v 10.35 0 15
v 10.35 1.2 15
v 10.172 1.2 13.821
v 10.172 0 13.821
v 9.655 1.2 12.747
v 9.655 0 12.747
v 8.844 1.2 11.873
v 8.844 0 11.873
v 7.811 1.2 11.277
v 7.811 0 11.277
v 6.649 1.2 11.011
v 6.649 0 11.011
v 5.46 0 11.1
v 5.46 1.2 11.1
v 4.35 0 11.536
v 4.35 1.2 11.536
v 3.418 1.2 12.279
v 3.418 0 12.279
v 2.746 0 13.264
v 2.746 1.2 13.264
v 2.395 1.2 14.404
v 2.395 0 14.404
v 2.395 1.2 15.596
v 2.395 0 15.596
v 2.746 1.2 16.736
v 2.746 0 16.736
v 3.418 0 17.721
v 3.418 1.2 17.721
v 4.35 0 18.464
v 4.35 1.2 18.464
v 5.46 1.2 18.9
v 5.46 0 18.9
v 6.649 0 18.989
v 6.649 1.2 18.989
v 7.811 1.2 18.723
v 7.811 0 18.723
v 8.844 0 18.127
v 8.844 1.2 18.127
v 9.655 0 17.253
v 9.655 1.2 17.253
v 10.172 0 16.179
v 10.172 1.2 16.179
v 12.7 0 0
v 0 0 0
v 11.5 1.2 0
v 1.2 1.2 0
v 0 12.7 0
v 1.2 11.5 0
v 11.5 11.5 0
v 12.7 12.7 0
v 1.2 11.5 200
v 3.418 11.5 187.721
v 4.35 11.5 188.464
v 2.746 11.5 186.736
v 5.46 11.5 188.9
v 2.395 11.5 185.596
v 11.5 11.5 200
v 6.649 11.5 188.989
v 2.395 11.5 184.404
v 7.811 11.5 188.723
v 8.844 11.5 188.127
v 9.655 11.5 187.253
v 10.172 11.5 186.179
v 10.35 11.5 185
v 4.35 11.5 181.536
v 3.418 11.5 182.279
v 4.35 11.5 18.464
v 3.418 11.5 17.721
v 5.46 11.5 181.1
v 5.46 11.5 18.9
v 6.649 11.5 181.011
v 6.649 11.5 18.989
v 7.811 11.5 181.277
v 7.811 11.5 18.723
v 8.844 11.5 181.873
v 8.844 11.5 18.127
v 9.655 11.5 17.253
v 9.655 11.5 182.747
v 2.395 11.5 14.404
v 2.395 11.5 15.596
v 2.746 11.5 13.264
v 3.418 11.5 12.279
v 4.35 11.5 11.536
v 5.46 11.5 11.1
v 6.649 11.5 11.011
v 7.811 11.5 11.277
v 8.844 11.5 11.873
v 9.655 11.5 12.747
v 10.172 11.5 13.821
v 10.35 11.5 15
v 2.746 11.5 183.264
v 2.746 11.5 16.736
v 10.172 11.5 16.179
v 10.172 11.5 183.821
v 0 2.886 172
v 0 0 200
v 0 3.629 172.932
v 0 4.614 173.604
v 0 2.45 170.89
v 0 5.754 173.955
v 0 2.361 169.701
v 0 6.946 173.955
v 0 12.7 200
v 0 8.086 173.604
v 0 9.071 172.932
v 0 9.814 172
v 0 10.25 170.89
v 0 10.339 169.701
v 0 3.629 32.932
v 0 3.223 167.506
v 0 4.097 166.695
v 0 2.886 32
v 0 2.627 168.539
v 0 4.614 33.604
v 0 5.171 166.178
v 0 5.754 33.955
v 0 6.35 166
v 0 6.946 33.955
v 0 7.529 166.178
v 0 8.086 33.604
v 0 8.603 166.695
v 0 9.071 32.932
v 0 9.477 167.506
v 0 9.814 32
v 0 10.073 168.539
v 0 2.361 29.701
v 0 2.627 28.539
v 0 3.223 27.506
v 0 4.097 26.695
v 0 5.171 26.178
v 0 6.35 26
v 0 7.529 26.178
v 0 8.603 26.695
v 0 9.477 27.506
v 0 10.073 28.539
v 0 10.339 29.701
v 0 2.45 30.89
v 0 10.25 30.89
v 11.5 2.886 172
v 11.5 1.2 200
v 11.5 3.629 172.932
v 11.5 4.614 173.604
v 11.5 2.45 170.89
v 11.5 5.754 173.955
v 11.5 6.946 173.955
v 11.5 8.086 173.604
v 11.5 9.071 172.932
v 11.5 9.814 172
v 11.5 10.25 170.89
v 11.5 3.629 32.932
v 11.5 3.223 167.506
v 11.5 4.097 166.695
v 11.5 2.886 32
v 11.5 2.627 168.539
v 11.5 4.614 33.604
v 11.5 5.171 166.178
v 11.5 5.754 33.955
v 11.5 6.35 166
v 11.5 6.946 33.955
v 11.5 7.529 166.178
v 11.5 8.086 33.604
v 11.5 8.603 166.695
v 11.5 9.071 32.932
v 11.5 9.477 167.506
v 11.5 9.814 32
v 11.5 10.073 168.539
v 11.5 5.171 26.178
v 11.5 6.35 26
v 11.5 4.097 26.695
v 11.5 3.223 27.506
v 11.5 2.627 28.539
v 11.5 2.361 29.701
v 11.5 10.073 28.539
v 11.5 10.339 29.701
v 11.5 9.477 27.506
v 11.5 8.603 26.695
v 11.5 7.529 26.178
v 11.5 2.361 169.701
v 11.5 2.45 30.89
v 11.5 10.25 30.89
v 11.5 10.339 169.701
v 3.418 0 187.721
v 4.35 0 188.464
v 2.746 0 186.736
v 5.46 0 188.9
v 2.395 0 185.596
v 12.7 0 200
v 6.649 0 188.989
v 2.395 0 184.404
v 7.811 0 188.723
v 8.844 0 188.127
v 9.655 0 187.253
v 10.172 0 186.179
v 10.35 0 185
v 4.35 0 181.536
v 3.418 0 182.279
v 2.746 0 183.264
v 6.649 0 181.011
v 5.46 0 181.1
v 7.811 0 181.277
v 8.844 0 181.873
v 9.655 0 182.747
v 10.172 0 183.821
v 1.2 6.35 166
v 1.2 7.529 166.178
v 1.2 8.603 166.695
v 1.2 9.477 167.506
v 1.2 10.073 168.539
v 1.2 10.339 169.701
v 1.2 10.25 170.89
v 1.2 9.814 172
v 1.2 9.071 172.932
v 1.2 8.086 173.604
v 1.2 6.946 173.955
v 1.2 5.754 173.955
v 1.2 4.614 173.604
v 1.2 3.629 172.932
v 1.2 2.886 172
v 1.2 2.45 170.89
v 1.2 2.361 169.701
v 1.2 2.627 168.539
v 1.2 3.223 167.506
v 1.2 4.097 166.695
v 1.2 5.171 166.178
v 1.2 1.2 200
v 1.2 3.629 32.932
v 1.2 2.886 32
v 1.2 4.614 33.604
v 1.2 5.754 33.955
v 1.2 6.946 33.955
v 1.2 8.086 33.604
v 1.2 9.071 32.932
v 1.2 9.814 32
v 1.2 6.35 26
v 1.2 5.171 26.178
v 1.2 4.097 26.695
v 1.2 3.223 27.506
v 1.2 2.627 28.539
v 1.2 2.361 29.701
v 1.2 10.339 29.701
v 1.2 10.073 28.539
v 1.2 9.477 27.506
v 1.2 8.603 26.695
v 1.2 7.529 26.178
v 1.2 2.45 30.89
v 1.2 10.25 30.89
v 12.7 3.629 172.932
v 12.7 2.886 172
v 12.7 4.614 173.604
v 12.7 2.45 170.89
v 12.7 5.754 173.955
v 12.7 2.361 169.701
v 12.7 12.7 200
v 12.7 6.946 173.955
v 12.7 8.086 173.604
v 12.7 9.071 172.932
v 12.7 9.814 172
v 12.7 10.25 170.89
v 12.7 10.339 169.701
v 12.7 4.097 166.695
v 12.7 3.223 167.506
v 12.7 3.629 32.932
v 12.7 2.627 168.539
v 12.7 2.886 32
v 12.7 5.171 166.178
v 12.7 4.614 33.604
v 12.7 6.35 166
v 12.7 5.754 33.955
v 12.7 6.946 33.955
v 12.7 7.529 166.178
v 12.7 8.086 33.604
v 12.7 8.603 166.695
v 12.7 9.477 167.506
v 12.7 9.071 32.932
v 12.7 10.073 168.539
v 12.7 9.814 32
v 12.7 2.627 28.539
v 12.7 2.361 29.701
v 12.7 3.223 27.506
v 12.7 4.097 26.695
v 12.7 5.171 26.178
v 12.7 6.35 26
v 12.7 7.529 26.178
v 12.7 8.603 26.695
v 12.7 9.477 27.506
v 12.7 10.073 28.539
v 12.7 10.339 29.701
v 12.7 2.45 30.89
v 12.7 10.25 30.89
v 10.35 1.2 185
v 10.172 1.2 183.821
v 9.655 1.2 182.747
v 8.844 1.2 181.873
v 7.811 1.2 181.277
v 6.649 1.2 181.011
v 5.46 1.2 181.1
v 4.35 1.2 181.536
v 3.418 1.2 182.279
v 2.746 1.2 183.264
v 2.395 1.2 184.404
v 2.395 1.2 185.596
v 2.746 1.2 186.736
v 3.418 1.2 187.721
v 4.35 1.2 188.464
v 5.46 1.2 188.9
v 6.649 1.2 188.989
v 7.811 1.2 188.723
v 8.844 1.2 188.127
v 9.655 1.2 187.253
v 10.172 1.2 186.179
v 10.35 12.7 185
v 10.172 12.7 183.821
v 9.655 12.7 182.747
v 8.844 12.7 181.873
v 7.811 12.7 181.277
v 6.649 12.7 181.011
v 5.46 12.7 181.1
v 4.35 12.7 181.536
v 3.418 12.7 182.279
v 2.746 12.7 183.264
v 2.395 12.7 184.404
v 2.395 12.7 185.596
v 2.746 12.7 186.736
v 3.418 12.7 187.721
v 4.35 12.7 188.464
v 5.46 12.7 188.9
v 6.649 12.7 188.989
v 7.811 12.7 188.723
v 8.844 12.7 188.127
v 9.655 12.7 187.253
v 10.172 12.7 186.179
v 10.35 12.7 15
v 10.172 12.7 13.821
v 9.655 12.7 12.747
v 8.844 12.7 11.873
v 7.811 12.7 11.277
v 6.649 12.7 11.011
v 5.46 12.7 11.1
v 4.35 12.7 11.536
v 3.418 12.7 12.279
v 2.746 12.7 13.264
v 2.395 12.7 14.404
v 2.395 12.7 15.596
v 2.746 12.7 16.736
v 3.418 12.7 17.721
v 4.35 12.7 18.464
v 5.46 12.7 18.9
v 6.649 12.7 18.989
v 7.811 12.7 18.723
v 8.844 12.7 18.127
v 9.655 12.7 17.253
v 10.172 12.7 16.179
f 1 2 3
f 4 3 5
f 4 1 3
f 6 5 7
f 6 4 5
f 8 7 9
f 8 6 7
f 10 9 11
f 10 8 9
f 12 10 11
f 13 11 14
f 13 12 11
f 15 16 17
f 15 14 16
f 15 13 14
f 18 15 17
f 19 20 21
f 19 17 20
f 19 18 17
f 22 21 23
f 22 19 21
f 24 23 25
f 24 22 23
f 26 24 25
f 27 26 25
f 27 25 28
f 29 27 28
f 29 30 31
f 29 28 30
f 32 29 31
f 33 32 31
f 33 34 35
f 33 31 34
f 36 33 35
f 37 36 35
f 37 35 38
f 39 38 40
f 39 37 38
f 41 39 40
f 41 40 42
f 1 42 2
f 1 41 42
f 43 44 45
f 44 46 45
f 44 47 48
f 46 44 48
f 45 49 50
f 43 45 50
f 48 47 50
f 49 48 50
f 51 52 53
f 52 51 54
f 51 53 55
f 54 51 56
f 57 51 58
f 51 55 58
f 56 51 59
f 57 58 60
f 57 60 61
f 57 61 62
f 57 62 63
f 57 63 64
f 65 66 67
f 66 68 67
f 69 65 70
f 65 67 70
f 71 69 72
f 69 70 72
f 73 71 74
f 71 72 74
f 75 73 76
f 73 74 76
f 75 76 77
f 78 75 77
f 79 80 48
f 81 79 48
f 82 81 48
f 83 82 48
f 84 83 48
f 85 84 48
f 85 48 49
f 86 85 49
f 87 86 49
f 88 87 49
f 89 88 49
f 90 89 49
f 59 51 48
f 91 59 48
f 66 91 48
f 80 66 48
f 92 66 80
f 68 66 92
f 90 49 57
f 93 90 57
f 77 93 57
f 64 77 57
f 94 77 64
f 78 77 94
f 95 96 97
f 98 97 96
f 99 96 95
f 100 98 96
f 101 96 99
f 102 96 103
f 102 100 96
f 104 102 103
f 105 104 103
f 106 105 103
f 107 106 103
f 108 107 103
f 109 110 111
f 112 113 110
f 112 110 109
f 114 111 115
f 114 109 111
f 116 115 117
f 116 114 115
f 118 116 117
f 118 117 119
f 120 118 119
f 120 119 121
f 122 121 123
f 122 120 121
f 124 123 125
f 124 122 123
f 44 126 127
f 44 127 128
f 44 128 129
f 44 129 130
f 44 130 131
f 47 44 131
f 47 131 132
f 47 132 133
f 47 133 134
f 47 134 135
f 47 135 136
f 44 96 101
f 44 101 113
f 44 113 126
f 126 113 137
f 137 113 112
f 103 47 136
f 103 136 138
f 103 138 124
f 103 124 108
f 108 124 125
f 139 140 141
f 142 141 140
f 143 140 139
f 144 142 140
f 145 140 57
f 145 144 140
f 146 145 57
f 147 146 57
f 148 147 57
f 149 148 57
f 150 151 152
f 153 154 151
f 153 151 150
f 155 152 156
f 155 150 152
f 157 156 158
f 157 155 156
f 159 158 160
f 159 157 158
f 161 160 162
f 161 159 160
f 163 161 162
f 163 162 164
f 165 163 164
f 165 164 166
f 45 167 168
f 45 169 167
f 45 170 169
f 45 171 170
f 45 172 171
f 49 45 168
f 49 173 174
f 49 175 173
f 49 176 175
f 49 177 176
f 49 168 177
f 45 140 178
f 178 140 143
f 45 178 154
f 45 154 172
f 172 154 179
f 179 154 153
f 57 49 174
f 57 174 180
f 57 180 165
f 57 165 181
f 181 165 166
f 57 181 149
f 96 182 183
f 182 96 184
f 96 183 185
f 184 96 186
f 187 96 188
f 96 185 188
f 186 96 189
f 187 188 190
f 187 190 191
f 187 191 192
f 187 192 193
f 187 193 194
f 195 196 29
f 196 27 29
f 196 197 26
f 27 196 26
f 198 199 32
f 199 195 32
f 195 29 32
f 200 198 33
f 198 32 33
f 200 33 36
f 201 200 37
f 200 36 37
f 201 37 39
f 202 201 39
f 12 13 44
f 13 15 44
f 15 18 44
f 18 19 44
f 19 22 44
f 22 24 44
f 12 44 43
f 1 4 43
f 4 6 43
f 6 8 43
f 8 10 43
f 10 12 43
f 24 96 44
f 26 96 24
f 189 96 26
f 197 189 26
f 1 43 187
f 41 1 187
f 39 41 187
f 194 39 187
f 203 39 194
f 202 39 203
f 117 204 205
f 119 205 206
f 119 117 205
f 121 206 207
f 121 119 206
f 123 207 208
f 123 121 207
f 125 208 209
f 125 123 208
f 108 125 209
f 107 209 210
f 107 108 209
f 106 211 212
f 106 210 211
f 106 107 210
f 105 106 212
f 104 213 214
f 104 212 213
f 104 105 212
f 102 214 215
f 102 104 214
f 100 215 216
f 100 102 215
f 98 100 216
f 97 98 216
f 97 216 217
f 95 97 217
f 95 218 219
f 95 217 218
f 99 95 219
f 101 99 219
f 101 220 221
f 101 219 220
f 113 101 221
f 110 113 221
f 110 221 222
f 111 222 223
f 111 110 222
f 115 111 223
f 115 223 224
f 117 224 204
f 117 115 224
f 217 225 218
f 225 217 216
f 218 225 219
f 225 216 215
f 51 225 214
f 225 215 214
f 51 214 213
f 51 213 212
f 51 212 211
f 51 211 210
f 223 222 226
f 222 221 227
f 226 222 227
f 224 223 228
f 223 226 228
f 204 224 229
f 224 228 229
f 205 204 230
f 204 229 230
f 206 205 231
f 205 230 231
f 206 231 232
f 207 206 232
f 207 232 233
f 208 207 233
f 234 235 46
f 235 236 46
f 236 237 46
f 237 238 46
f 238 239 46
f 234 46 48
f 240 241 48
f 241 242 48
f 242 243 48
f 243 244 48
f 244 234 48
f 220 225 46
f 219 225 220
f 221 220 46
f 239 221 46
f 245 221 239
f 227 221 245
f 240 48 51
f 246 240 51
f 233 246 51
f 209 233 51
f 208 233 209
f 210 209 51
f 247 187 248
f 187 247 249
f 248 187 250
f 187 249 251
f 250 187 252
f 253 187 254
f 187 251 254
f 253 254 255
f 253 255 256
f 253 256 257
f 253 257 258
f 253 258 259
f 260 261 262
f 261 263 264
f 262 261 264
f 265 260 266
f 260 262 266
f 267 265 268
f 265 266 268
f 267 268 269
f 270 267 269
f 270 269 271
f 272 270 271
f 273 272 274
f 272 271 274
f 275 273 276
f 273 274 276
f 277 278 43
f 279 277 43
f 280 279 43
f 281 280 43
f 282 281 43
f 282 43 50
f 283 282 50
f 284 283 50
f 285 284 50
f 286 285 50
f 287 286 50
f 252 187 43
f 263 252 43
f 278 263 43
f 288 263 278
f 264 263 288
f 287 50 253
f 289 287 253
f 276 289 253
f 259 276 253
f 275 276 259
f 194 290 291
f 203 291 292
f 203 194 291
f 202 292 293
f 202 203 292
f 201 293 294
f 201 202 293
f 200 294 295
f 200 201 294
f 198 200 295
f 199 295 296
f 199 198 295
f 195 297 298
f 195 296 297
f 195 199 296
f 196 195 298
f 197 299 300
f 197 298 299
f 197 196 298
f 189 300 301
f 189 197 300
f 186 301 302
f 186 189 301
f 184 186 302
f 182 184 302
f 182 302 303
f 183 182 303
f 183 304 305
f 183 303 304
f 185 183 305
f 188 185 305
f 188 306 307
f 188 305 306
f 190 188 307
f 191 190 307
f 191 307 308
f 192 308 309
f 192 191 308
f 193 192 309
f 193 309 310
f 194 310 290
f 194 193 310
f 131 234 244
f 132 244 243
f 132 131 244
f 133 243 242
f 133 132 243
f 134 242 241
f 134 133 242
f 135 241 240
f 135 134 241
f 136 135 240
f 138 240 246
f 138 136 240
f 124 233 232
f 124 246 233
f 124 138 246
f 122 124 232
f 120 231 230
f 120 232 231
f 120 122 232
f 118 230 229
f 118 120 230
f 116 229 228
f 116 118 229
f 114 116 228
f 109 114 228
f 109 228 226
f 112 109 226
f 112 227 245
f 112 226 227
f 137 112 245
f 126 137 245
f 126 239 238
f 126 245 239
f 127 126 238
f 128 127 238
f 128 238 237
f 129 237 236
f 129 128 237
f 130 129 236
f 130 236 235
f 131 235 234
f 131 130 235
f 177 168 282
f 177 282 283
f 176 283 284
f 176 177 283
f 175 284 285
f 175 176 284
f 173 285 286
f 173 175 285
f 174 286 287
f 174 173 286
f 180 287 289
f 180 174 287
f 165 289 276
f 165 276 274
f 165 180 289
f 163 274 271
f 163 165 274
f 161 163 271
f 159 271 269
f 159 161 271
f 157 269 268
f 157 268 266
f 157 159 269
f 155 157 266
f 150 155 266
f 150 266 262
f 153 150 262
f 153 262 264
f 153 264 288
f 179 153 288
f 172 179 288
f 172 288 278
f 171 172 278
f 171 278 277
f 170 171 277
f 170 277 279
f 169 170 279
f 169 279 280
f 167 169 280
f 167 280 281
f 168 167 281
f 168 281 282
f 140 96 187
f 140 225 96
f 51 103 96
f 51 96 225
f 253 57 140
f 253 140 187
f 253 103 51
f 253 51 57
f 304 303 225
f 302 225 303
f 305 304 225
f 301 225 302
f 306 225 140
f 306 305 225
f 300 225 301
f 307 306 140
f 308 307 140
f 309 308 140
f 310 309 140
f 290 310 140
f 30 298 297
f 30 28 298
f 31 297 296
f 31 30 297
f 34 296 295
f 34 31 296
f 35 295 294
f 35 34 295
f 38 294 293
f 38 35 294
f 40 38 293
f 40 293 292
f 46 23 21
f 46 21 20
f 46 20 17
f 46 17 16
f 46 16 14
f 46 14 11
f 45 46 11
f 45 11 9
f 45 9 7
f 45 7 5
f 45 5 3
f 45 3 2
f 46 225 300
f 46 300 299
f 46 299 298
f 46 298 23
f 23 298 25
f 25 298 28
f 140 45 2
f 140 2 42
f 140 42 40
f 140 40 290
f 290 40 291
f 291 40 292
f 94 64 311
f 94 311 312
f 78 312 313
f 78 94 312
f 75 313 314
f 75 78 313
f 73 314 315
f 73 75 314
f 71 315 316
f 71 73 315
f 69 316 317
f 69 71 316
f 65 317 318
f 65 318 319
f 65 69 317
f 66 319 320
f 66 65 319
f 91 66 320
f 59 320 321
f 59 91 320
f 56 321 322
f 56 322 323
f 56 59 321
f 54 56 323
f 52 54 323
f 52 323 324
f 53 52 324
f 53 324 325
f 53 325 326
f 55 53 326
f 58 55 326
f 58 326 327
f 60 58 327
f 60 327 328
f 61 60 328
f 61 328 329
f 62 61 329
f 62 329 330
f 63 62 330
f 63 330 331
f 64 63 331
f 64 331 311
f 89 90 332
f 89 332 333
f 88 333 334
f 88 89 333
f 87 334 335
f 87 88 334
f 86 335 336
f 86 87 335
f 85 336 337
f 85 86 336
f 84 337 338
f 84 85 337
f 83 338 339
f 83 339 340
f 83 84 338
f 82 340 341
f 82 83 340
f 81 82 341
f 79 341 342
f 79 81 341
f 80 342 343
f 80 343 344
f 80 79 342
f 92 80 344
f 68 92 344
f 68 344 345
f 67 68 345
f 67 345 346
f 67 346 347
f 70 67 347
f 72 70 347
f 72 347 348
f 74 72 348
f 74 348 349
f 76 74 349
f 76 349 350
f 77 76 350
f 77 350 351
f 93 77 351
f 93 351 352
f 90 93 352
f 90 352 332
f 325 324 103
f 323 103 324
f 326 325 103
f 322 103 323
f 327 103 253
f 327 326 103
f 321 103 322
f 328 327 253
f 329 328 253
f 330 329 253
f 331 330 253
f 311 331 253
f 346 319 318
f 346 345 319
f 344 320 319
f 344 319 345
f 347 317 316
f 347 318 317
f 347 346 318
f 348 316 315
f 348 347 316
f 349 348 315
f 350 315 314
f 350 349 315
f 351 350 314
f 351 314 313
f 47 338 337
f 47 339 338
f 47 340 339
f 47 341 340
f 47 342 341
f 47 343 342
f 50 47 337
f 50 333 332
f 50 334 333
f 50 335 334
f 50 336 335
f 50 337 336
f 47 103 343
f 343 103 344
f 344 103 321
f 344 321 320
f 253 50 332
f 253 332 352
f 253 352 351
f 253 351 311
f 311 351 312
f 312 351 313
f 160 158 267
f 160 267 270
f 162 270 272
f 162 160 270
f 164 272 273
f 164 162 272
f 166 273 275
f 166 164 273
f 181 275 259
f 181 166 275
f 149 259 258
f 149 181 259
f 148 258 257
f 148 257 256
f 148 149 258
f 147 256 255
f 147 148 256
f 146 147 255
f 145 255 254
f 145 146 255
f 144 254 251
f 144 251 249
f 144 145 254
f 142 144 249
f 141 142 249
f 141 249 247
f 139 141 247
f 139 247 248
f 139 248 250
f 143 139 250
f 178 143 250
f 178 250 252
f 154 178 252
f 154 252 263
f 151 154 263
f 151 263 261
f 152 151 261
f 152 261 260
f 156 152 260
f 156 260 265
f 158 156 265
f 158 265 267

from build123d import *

# Parameters (mm, degrees)
CYLINDER003_R     = 4
CYLINDER003_DEPTH = 12.7
CYLINDER002_R     = 4
CYLINDER002_DEPTH = 12.7
CYLINDER_R        = 4
CYLINDER_DEPTH    = 12.7
CYLINDER001_R     = 4
CYLINDER001_DEPTH = 12.7
BOX001_W          = 10.3
BOX001_H          = 10.3
BOX001_DEPTH      = 200
BOX_W             = 12.7
BOX_H             = 12.7
BOX_DEPTH         = 200


with BuildPart() as cilindro003:
    # Cylinder003 → Cylinder003 (new body)
    with BuildSketch(Plane(origin=(0, 6.35, 170), x_dir=(0, 0, -1), z_dir=(1, 0, 0))):
        Circle(CYLINDER003_R)
    extrude(amount=CYLINDER003_DEPTH)


with BuildPart() as cilindro002:
    # Cylinder002 → Cylinder002 (new body)
    with BuildSketch(Plane(origin=(0, 6.35, 30), x_dir=(0, 0, -1), z_dir=(1, 0, 0))):
        Circle(CYLINDER002_R)
    extrude(amount=CYLINDER002_DEPTH)


with BuildPart() as cilindro:
    # Cylinder → Cylinder (new body)
    with BuildSketch(Plane(origin=(6.35, 0, 15), x_dir=(1, 0, 0), z_dir=(0, 1, 0))):
        Circle(CYLINDER_R)
    extrude(amount=CYLINDER_DEPTH)


with BuildPart() as cilindro001:
    # Cylinder001 → Cylinder001 (new body)
    with BuildSketch(Plane(origin=(6.35, 0, 185), x_dir=(1, 0, 0), z_dir=(0, 1, 0))):
        Circle(CYLINDER001_R)
    extrude(amount=CYLINDER001_DEPTH)


with BuildPart() as cubointerni:
    # Box001 → Box001 (new body)
    with BuildSketch(Plane(origin=(1.2, 1.2, 0), x_dir=(1, 0, 0), z_dir=(0, 0, 1))):
        with Locations((5.15, 5.15)):
            Rectangle(BOX001_W, BOX001_H)
    extrude(amount=BOX001_DEPTH)


with BuildPart() as postebarrenado:
    # Box → Box (new body)
    with BuildSketch(Plane.XY):
        with Locations((6.35, 6.35)):
            Rectangle(BOX_W, BOX_H)
    extrude(amount=BOX_DEPTH)

    # Cut: cut cuboInterni
    add(cubointerni.part, mode=Mode.SUBTRACT)

    # Cut001: cut Cilindro001
    add(cilindro001.part, mode=Mode.SUBTRACT)

    # Cut002: cut Cilindro
    add(cilindro.part, mode=Mode.SUBTRACT)

    # Cut003: cut Cilindro002
    add(cilindro002.part, mode=Mode.SUBTRACT)

    # Cut004: cut Cilindro003
    add(cilindro003.part, mode=Mode.SUBTRACT)


solid = postebarrenado.part
